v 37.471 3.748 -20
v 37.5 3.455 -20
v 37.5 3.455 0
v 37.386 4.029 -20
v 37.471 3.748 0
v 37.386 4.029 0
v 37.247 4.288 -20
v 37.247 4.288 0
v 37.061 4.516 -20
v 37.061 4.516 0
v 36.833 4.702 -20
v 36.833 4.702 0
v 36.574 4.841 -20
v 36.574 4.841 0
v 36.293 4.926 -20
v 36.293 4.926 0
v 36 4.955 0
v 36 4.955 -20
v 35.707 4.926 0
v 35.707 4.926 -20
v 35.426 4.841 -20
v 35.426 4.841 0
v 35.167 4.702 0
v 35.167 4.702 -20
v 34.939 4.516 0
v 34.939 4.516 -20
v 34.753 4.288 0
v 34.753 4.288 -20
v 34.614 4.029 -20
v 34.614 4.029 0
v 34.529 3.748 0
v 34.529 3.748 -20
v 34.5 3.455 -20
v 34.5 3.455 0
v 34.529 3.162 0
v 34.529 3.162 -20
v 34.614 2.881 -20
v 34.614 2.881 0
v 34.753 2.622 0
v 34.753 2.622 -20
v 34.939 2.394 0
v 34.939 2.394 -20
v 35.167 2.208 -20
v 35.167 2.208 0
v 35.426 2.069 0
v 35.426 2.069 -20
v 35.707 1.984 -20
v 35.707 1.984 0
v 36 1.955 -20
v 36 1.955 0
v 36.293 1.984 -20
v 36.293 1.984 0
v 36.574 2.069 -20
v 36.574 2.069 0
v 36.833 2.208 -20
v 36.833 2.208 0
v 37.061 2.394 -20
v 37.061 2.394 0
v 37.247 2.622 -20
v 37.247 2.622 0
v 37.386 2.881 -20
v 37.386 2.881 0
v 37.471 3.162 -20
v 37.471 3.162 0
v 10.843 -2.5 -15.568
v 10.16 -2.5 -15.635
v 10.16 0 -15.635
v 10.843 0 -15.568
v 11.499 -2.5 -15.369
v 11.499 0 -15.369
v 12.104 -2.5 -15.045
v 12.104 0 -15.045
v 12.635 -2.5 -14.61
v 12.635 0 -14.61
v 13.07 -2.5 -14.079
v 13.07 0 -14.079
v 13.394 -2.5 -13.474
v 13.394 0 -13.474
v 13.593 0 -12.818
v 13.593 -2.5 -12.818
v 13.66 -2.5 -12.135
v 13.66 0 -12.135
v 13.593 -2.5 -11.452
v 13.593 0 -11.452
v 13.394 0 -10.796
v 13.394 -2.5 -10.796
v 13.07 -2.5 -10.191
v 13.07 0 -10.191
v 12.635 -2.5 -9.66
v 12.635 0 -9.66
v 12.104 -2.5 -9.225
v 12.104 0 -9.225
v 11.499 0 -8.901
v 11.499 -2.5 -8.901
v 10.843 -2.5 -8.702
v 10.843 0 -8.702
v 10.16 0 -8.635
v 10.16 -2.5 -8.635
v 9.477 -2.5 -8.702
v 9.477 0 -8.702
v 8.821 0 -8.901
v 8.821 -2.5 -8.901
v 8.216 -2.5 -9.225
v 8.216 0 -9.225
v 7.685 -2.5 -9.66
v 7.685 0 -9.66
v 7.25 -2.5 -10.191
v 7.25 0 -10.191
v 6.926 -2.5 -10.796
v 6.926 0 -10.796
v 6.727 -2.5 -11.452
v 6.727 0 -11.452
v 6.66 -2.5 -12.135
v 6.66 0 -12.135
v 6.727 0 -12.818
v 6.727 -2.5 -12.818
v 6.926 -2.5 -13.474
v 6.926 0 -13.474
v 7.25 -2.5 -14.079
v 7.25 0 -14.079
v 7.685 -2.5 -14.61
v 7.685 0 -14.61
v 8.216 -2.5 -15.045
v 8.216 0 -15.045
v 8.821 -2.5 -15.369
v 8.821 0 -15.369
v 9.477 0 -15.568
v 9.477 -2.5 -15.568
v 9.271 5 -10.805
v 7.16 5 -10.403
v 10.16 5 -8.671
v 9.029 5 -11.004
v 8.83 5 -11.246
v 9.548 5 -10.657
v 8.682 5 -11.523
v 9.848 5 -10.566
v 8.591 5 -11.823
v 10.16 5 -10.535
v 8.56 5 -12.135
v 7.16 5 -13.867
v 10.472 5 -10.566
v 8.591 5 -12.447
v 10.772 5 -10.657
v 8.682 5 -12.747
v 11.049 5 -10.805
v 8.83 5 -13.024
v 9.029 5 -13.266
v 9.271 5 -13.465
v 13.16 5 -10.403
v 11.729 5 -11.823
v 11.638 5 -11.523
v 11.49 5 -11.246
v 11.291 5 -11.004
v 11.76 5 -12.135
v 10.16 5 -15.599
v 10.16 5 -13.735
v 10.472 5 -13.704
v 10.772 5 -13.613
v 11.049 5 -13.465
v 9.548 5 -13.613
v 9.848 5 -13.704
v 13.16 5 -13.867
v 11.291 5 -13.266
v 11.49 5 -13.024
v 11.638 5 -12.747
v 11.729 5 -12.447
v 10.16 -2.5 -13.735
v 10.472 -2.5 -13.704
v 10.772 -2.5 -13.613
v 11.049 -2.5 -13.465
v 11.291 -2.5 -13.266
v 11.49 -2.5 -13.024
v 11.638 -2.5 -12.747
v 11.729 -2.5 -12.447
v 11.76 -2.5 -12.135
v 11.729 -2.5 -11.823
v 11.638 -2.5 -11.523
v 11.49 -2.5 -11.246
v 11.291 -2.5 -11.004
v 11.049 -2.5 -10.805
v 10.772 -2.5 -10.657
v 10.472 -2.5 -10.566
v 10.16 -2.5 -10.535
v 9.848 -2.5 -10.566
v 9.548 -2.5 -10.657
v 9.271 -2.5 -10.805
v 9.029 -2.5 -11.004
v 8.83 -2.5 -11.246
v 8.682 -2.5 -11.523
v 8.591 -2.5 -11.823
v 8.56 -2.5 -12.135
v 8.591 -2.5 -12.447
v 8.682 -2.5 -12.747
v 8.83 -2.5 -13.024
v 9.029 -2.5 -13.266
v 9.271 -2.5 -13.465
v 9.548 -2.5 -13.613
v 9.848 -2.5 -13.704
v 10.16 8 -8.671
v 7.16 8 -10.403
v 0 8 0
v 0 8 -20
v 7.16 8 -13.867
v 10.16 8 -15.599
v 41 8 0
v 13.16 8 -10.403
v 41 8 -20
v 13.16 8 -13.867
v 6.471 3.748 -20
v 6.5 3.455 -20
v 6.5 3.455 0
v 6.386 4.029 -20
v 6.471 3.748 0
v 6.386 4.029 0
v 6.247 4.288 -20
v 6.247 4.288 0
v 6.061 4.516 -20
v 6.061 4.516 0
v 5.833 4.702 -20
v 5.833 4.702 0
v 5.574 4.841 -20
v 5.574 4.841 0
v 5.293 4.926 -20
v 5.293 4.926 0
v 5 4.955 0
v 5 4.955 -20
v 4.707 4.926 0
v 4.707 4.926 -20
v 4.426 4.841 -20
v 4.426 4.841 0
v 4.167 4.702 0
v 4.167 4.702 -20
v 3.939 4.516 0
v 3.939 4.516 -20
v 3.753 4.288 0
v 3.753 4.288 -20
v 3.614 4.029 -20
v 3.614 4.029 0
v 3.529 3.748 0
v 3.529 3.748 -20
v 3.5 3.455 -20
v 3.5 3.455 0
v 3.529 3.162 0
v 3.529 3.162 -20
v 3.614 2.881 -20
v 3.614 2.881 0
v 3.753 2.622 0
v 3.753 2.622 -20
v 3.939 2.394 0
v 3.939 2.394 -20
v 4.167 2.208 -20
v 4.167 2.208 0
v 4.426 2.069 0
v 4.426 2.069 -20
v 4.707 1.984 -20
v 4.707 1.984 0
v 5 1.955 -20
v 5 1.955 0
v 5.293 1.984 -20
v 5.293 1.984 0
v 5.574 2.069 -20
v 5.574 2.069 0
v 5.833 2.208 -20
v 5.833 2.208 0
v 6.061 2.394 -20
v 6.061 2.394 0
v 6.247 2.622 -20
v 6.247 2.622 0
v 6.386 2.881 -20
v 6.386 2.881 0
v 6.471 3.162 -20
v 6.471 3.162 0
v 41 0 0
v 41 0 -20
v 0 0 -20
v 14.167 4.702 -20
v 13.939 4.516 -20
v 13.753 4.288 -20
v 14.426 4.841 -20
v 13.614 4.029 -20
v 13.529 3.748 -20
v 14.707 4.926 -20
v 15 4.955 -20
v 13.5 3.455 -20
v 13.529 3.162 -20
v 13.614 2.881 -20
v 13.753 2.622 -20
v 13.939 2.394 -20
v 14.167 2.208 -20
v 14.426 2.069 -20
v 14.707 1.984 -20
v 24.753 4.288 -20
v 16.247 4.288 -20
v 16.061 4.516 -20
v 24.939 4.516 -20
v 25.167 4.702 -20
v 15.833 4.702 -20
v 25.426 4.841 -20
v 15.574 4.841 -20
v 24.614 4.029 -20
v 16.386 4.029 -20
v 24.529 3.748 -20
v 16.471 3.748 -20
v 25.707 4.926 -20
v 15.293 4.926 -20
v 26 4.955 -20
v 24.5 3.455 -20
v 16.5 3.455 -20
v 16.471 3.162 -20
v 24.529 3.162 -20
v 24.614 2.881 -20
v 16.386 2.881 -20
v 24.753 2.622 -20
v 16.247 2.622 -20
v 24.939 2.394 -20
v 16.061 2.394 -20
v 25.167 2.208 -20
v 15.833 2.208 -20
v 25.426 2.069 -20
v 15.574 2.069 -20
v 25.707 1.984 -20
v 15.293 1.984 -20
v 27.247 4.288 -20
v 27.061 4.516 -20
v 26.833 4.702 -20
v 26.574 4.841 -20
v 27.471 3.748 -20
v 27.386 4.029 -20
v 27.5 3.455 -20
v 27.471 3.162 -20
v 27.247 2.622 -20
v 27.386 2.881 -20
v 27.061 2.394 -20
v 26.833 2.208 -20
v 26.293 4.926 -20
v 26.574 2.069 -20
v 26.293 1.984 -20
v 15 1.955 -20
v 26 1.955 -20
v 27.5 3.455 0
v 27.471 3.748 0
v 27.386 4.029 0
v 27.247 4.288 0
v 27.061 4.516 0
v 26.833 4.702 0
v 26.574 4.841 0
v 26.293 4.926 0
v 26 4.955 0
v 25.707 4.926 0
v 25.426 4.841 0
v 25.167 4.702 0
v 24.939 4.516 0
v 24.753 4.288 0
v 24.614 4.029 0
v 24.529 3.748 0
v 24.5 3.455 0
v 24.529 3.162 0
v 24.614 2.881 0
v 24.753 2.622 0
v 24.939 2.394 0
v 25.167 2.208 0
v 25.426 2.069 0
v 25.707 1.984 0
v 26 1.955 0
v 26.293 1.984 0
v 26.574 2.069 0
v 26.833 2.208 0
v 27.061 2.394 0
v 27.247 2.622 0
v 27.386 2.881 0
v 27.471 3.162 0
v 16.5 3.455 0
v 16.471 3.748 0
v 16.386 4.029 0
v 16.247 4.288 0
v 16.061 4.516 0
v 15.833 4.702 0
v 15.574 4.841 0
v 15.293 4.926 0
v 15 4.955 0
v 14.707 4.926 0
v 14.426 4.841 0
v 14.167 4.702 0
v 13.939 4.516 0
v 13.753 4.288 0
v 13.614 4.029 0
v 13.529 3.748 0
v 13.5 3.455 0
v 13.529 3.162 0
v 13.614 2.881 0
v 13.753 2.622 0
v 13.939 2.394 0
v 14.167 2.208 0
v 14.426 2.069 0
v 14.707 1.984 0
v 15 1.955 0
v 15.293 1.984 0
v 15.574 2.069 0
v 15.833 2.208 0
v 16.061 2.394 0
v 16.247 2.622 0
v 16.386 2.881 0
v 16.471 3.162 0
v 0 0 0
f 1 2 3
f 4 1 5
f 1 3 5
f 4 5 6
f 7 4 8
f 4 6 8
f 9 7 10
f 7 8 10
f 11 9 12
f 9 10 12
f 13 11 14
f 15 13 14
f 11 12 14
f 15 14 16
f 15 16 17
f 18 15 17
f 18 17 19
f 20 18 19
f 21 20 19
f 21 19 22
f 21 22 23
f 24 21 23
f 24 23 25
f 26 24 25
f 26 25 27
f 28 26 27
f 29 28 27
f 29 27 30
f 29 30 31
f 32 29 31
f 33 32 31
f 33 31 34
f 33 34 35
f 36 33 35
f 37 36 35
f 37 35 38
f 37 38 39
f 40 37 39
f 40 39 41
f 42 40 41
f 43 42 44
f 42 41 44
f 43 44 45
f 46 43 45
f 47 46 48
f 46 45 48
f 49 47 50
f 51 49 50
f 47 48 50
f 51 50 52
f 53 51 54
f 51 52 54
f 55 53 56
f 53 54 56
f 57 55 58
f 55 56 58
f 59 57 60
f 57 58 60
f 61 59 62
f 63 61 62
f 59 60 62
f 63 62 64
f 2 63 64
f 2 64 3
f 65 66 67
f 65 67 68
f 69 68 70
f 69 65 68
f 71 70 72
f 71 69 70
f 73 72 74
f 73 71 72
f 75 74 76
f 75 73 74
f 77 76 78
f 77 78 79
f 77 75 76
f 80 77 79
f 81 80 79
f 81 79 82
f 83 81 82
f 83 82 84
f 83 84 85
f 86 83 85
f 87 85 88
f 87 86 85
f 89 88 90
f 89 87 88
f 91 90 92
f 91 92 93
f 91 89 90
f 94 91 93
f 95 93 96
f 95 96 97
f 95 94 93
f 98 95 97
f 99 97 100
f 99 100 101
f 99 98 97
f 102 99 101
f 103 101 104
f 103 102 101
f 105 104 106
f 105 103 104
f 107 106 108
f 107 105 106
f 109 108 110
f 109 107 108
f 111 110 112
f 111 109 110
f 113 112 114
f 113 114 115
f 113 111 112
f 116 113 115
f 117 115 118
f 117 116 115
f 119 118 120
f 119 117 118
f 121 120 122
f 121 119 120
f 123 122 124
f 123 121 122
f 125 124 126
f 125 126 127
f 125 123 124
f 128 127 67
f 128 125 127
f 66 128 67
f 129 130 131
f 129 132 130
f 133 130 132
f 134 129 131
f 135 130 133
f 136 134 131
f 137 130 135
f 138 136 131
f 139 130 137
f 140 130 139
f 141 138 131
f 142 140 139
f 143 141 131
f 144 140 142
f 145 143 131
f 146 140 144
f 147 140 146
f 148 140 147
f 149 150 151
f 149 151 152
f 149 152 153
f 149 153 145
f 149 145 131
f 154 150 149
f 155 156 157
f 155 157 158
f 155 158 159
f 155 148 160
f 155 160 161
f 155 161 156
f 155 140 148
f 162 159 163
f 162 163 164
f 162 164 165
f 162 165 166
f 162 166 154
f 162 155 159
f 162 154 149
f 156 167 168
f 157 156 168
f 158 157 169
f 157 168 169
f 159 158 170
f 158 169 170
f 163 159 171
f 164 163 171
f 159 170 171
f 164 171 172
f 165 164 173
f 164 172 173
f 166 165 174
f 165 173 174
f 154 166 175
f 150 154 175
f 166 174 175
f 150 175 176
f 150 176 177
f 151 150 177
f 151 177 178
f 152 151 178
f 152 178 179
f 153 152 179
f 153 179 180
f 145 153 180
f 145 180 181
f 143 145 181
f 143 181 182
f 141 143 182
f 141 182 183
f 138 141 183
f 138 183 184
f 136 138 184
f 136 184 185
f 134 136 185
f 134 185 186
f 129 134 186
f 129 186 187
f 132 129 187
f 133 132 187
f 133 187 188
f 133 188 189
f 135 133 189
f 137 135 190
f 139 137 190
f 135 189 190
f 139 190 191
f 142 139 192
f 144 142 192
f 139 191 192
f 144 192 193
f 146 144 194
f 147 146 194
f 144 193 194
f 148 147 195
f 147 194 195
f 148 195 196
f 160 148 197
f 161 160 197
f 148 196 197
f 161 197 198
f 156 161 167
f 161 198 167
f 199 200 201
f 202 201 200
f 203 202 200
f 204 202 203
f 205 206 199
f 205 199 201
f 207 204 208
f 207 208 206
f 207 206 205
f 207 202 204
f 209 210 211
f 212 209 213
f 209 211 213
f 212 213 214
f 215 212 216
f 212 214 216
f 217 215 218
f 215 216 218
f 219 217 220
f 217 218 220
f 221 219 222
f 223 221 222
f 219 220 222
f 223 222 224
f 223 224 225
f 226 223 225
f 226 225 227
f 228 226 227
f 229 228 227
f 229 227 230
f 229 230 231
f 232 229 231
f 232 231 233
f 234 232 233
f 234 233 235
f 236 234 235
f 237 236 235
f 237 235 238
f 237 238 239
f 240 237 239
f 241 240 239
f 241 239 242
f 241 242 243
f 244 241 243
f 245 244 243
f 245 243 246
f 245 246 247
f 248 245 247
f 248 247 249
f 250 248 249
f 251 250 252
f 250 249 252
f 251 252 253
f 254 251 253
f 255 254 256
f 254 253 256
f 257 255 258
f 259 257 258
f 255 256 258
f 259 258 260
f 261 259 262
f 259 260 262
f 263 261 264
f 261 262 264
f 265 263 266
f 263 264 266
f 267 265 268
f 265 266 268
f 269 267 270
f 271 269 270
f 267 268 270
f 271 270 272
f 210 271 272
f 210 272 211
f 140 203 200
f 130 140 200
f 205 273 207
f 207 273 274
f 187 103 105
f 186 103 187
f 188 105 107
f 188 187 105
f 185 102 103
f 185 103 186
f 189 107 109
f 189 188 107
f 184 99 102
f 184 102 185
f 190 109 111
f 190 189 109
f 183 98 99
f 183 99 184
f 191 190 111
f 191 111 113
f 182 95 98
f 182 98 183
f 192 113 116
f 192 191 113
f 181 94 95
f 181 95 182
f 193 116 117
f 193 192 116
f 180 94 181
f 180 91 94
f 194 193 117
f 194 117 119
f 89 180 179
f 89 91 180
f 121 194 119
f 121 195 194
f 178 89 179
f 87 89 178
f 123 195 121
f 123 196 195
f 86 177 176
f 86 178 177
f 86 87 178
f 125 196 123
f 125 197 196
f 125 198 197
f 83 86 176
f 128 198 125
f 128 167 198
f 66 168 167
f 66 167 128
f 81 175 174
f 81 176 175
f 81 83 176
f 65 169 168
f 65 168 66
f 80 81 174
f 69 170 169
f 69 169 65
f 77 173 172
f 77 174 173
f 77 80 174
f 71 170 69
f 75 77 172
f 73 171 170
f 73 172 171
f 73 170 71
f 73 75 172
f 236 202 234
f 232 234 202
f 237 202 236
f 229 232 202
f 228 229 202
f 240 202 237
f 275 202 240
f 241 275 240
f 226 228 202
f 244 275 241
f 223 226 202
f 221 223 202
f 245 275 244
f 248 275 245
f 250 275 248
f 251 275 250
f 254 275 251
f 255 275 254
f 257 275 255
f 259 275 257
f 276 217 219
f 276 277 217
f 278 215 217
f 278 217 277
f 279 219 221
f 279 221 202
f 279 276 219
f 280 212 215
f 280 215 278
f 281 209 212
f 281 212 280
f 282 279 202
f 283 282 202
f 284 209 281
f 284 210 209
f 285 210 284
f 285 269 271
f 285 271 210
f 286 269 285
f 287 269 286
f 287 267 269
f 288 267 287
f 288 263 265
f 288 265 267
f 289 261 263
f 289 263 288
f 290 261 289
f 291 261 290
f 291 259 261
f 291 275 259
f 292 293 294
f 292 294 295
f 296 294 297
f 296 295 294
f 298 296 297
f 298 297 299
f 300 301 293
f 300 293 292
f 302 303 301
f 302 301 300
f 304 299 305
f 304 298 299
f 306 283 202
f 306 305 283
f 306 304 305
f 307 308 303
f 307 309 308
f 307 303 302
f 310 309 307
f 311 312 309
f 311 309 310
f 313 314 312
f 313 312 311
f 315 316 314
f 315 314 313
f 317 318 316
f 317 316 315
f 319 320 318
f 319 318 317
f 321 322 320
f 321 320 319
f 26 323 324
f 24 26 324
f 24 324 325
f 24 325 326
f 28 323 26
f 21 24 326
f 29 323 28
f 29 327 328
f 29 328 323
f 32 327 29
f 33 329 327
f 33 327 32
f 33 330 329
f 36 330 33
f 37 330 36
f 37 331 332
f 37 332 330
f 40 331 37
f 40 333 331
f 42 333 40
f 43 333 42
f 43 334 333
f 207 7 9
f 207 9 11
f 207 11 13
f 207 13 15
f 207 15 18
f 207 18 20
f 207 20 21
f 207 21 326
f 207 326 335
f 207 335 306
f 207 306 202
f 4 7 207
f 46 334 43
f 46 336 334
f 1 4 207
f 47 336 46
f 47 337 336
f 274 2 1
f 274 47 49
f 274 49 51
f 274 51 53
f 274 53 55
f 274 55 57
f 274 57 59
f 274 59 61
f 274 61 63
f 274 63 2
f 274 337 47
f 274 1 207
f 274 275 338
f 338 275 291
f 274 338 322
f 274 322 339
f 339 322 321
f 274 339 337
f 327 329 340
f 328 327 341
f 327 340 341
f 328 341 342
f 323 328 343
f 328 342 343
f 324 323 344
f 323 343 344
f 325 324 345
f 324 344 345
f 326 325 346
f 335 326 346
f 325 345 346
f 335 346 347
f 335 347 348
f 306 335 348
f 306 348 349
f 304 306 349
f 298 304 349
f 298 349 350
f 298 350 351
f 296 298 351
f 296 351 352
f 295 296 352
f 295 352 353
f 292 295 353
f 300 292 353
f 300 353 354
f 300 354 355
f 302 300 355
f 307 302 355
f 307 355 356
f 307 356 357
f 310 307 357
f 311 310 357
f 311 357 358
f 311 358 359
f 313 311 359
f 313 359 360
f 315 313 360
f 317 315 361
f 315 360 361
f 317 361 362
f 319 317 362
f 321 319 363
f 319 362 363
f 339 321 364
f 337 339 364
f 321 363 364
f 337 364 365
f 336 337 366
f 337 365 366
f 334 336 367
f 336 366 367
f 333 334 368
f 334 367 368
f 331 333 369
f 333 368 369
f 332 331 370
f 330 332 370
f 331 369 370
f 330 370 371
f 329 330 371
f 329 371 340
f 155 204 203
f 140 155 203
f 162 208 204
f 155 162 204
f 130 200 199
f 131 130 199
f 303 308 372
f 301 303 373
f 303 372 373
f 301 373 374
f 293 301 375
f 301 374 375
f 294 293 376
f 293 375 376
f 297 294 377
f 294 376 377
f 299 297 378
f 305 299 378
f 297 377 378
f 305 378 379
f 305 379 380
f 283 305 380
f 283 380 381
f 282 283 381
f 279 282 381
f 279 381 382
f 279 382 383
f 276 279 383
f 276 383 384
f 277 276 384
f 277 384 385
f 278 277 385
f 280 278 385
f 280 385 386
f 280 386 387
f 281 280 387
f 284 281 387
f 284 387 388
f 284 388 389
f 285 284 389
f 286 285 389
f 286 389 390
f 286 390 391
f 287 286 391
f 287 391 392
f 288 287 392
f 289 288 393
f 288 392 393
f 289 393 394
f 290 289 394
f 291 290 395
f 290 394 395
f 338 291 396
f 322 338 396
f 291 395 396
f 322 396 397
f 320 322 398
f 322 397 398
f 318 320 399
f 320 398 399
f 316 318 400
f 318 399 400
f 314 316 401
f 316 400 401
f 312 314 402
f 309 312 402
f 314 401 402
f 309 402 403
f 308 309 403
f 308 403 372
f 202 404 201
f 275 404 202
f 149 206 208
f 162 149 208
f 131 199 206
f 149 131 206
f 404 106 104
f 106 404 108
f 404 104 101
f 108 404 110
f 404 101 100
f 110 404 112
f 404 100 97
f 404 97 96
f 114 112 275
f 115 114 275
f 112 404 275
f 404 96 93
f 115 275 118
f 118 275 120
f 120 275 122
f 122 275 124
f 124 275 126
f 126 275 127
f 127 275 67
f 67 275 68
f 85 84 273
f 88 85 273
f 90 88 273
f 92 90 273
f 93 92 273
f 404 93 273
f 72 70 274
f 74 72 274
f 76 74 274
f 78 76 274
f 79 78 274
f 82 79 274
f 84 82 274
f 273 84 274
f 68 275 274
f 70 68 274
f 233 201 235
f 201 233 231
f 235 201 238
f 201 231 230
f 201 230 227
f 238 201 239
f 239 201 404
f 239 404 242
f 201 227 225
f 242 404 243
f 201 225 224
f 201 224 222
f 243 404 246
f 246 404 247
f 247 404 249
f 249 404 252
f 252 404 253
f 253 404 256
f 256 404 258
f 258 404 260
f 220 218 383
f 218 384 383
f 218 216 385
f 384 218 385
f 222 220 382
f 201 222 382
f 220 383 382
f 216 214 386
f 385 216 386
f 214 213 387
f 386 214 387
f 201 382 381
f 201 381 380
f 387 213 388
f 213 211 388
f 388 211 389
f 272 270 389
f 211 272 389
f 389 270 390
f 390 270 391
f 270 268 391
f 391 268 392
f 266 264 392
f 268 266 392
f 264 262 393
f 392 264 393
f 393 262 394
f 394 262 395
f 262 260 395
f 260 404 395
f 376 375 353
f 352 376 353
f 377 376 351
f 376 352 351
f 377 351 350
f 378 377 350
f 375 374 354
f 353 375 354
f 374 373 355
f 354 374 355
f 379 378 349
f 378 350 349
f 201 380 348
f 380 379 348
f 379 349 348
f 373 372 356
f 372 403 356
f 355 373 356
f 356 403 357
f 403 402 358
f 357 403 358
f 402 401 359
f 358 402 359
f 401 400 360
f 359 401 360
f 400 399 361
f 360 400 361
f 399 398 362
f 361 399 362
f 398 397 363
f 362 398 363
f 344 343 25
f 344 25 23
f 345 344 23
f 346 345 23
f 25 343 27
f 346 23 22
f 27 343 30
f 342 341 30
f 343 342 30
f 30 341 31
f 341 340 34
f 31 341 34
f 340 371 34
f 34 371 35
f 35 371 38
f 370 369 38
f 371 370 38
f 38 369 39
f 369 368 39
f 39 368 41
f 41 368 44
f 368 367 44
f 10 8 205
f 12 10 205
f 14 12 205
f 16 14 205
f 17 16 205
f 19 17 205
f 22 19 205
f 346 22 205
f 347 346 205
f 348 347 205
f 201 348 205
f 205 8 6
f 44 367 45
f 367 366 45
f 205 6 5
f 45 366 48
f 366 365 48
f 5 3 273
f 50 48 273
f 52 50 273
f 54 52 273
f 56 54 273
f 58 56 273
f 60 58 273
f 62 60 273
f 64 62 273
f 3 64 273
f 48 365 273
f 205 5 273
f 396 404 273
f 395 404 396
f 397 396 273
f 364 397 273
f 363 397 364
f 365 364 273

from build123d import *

# Parameters (mm, degrees)
SKETCH1_W           = 41
SKETCH1_H           = 20
BOSS_EXTRUDE1_DEPTH = 8
SKETCH2_R           = 1.5
CUT_EXTRUDE1_DEPTH  = 47.314144708
LPATTERN1_COUNT     = 2
LPATTERN1_PITCH     = 10
LPATTERN2_COUNT     = 2
LPATTERN2_PITCH     = 21
LPATTERN3_COUNT     = 2
LPATTERN3_PITCH     = 31
SKETCH3_R           = 1.6
CUT_EXTRUDE6_DEPTH  = 47.314144708
BOSS_EXTRUDE6_START = 2.5
SKETCH13_R          = 3.5
SKETCH13_R_2        = 1.6
BOSS_EXTRUDE6_DEPTH = 2.5
CUT_EXTRUDE7_DEPTH  = 3


with BuildPart() as part:
    # Sketch1 → Boss-Extrude1 (new body)
    with BuildSketch(Plane(origin=(0, 0, 0), x_dir=(1, 0, 0), z_dir=(0, 1, 0))):
        with Locations((20.5, 10)):
            Rectangle(SKETCH1_W, SKETCH1_H)
    extrude(amount=BOSS_EXTRUDE1_DEPTH)

    # Sketch2 → Cut-Extrude1 (cut, through all)
    with BuildSketch(Plane.XY):
        with Locations((5, 3.455)):
            Circle(SKETCH2_R)
    cut_extrude1 = extrude(amount=-CUT_EXTRUDE1_DEPTH, mode=Mode.SUBTRACT)

    # LPattern1: Cut-Extrude1 ×2
    with Locations(*[(i * LPATTERN1_PITCH, 0, 0) for i in range(1, LPATTERN1_COUNT)]):
        add(cut_extrude1, mode=Mode.SUBTRACT)

    # LPattern2: Cut-Extrude1 ×2
    with Locations(*[(i * LPATTERN2_PITCH, 0, 0) for i in range(1, LPATTERN2_COUNT)]):
        add(cut_extrude1, mode=Mode.SUBTRACT)

    # LPattern3: Cut-Extrude1 ×2
    with Locations(*[(i * LPATTERN3_PITCH, 0, 0) for i in range(1, LPATTERN3_COUNT)]):
        add(cut_extrude1, mode=Mode.SUBTRACT)

    # Sketch3 → Cut-Extrude6 (cut, through all)
    with BuildSketch(Plane(origin=(0, 0, 0), x_dir=(1, 0, 0), z_dir=(0, 1, 0))):
        with Locations(Location((10.16, 12.135, 0), (0, 0, 90))):
            Circle(SKETCH3_R)
    extrude(amount=CUT_EXTRUDE6_DEPTH, mode=Mode.SUBTRACT)

    # Sketch13 → Boss-Extrude6 (add)
    with BuildSketch(Plane.XZ.offset(BOSS_EXTRUDE6_START)):
        with Locations(Location((10.16, -12.135, 0), (0, 0, 270))):
            Circle(SKETCH13_R)
        with Locations(Location((10.16, -12.135, 0), (0, 0, 270))):
            Circle(SKETCH13_R_2, mode=Mode.SUBTRACT)
    extrude(amount=-BOSS_EXTRUDE6_DEPTH)

    # Sketch14 → Cut-Extrude7 (cut)
    with BuildSketch(Plane(origin=(0, 8, 0), x_dir=(1, 0, 0), z_dir=(0, 1, 0))):
        Polygon((7.16, 10.402949192), (10.16, 8.670898385), (13.16, 10.402949192), (13.16, 13.867050808), (10.16, 15.599101615), (7.16, 13.867050808), align=None)
    extrude(amount=-CUT_EXTRUDE7_DEPTH, mode=Mode.SUBTRACT)


solid = part.part
